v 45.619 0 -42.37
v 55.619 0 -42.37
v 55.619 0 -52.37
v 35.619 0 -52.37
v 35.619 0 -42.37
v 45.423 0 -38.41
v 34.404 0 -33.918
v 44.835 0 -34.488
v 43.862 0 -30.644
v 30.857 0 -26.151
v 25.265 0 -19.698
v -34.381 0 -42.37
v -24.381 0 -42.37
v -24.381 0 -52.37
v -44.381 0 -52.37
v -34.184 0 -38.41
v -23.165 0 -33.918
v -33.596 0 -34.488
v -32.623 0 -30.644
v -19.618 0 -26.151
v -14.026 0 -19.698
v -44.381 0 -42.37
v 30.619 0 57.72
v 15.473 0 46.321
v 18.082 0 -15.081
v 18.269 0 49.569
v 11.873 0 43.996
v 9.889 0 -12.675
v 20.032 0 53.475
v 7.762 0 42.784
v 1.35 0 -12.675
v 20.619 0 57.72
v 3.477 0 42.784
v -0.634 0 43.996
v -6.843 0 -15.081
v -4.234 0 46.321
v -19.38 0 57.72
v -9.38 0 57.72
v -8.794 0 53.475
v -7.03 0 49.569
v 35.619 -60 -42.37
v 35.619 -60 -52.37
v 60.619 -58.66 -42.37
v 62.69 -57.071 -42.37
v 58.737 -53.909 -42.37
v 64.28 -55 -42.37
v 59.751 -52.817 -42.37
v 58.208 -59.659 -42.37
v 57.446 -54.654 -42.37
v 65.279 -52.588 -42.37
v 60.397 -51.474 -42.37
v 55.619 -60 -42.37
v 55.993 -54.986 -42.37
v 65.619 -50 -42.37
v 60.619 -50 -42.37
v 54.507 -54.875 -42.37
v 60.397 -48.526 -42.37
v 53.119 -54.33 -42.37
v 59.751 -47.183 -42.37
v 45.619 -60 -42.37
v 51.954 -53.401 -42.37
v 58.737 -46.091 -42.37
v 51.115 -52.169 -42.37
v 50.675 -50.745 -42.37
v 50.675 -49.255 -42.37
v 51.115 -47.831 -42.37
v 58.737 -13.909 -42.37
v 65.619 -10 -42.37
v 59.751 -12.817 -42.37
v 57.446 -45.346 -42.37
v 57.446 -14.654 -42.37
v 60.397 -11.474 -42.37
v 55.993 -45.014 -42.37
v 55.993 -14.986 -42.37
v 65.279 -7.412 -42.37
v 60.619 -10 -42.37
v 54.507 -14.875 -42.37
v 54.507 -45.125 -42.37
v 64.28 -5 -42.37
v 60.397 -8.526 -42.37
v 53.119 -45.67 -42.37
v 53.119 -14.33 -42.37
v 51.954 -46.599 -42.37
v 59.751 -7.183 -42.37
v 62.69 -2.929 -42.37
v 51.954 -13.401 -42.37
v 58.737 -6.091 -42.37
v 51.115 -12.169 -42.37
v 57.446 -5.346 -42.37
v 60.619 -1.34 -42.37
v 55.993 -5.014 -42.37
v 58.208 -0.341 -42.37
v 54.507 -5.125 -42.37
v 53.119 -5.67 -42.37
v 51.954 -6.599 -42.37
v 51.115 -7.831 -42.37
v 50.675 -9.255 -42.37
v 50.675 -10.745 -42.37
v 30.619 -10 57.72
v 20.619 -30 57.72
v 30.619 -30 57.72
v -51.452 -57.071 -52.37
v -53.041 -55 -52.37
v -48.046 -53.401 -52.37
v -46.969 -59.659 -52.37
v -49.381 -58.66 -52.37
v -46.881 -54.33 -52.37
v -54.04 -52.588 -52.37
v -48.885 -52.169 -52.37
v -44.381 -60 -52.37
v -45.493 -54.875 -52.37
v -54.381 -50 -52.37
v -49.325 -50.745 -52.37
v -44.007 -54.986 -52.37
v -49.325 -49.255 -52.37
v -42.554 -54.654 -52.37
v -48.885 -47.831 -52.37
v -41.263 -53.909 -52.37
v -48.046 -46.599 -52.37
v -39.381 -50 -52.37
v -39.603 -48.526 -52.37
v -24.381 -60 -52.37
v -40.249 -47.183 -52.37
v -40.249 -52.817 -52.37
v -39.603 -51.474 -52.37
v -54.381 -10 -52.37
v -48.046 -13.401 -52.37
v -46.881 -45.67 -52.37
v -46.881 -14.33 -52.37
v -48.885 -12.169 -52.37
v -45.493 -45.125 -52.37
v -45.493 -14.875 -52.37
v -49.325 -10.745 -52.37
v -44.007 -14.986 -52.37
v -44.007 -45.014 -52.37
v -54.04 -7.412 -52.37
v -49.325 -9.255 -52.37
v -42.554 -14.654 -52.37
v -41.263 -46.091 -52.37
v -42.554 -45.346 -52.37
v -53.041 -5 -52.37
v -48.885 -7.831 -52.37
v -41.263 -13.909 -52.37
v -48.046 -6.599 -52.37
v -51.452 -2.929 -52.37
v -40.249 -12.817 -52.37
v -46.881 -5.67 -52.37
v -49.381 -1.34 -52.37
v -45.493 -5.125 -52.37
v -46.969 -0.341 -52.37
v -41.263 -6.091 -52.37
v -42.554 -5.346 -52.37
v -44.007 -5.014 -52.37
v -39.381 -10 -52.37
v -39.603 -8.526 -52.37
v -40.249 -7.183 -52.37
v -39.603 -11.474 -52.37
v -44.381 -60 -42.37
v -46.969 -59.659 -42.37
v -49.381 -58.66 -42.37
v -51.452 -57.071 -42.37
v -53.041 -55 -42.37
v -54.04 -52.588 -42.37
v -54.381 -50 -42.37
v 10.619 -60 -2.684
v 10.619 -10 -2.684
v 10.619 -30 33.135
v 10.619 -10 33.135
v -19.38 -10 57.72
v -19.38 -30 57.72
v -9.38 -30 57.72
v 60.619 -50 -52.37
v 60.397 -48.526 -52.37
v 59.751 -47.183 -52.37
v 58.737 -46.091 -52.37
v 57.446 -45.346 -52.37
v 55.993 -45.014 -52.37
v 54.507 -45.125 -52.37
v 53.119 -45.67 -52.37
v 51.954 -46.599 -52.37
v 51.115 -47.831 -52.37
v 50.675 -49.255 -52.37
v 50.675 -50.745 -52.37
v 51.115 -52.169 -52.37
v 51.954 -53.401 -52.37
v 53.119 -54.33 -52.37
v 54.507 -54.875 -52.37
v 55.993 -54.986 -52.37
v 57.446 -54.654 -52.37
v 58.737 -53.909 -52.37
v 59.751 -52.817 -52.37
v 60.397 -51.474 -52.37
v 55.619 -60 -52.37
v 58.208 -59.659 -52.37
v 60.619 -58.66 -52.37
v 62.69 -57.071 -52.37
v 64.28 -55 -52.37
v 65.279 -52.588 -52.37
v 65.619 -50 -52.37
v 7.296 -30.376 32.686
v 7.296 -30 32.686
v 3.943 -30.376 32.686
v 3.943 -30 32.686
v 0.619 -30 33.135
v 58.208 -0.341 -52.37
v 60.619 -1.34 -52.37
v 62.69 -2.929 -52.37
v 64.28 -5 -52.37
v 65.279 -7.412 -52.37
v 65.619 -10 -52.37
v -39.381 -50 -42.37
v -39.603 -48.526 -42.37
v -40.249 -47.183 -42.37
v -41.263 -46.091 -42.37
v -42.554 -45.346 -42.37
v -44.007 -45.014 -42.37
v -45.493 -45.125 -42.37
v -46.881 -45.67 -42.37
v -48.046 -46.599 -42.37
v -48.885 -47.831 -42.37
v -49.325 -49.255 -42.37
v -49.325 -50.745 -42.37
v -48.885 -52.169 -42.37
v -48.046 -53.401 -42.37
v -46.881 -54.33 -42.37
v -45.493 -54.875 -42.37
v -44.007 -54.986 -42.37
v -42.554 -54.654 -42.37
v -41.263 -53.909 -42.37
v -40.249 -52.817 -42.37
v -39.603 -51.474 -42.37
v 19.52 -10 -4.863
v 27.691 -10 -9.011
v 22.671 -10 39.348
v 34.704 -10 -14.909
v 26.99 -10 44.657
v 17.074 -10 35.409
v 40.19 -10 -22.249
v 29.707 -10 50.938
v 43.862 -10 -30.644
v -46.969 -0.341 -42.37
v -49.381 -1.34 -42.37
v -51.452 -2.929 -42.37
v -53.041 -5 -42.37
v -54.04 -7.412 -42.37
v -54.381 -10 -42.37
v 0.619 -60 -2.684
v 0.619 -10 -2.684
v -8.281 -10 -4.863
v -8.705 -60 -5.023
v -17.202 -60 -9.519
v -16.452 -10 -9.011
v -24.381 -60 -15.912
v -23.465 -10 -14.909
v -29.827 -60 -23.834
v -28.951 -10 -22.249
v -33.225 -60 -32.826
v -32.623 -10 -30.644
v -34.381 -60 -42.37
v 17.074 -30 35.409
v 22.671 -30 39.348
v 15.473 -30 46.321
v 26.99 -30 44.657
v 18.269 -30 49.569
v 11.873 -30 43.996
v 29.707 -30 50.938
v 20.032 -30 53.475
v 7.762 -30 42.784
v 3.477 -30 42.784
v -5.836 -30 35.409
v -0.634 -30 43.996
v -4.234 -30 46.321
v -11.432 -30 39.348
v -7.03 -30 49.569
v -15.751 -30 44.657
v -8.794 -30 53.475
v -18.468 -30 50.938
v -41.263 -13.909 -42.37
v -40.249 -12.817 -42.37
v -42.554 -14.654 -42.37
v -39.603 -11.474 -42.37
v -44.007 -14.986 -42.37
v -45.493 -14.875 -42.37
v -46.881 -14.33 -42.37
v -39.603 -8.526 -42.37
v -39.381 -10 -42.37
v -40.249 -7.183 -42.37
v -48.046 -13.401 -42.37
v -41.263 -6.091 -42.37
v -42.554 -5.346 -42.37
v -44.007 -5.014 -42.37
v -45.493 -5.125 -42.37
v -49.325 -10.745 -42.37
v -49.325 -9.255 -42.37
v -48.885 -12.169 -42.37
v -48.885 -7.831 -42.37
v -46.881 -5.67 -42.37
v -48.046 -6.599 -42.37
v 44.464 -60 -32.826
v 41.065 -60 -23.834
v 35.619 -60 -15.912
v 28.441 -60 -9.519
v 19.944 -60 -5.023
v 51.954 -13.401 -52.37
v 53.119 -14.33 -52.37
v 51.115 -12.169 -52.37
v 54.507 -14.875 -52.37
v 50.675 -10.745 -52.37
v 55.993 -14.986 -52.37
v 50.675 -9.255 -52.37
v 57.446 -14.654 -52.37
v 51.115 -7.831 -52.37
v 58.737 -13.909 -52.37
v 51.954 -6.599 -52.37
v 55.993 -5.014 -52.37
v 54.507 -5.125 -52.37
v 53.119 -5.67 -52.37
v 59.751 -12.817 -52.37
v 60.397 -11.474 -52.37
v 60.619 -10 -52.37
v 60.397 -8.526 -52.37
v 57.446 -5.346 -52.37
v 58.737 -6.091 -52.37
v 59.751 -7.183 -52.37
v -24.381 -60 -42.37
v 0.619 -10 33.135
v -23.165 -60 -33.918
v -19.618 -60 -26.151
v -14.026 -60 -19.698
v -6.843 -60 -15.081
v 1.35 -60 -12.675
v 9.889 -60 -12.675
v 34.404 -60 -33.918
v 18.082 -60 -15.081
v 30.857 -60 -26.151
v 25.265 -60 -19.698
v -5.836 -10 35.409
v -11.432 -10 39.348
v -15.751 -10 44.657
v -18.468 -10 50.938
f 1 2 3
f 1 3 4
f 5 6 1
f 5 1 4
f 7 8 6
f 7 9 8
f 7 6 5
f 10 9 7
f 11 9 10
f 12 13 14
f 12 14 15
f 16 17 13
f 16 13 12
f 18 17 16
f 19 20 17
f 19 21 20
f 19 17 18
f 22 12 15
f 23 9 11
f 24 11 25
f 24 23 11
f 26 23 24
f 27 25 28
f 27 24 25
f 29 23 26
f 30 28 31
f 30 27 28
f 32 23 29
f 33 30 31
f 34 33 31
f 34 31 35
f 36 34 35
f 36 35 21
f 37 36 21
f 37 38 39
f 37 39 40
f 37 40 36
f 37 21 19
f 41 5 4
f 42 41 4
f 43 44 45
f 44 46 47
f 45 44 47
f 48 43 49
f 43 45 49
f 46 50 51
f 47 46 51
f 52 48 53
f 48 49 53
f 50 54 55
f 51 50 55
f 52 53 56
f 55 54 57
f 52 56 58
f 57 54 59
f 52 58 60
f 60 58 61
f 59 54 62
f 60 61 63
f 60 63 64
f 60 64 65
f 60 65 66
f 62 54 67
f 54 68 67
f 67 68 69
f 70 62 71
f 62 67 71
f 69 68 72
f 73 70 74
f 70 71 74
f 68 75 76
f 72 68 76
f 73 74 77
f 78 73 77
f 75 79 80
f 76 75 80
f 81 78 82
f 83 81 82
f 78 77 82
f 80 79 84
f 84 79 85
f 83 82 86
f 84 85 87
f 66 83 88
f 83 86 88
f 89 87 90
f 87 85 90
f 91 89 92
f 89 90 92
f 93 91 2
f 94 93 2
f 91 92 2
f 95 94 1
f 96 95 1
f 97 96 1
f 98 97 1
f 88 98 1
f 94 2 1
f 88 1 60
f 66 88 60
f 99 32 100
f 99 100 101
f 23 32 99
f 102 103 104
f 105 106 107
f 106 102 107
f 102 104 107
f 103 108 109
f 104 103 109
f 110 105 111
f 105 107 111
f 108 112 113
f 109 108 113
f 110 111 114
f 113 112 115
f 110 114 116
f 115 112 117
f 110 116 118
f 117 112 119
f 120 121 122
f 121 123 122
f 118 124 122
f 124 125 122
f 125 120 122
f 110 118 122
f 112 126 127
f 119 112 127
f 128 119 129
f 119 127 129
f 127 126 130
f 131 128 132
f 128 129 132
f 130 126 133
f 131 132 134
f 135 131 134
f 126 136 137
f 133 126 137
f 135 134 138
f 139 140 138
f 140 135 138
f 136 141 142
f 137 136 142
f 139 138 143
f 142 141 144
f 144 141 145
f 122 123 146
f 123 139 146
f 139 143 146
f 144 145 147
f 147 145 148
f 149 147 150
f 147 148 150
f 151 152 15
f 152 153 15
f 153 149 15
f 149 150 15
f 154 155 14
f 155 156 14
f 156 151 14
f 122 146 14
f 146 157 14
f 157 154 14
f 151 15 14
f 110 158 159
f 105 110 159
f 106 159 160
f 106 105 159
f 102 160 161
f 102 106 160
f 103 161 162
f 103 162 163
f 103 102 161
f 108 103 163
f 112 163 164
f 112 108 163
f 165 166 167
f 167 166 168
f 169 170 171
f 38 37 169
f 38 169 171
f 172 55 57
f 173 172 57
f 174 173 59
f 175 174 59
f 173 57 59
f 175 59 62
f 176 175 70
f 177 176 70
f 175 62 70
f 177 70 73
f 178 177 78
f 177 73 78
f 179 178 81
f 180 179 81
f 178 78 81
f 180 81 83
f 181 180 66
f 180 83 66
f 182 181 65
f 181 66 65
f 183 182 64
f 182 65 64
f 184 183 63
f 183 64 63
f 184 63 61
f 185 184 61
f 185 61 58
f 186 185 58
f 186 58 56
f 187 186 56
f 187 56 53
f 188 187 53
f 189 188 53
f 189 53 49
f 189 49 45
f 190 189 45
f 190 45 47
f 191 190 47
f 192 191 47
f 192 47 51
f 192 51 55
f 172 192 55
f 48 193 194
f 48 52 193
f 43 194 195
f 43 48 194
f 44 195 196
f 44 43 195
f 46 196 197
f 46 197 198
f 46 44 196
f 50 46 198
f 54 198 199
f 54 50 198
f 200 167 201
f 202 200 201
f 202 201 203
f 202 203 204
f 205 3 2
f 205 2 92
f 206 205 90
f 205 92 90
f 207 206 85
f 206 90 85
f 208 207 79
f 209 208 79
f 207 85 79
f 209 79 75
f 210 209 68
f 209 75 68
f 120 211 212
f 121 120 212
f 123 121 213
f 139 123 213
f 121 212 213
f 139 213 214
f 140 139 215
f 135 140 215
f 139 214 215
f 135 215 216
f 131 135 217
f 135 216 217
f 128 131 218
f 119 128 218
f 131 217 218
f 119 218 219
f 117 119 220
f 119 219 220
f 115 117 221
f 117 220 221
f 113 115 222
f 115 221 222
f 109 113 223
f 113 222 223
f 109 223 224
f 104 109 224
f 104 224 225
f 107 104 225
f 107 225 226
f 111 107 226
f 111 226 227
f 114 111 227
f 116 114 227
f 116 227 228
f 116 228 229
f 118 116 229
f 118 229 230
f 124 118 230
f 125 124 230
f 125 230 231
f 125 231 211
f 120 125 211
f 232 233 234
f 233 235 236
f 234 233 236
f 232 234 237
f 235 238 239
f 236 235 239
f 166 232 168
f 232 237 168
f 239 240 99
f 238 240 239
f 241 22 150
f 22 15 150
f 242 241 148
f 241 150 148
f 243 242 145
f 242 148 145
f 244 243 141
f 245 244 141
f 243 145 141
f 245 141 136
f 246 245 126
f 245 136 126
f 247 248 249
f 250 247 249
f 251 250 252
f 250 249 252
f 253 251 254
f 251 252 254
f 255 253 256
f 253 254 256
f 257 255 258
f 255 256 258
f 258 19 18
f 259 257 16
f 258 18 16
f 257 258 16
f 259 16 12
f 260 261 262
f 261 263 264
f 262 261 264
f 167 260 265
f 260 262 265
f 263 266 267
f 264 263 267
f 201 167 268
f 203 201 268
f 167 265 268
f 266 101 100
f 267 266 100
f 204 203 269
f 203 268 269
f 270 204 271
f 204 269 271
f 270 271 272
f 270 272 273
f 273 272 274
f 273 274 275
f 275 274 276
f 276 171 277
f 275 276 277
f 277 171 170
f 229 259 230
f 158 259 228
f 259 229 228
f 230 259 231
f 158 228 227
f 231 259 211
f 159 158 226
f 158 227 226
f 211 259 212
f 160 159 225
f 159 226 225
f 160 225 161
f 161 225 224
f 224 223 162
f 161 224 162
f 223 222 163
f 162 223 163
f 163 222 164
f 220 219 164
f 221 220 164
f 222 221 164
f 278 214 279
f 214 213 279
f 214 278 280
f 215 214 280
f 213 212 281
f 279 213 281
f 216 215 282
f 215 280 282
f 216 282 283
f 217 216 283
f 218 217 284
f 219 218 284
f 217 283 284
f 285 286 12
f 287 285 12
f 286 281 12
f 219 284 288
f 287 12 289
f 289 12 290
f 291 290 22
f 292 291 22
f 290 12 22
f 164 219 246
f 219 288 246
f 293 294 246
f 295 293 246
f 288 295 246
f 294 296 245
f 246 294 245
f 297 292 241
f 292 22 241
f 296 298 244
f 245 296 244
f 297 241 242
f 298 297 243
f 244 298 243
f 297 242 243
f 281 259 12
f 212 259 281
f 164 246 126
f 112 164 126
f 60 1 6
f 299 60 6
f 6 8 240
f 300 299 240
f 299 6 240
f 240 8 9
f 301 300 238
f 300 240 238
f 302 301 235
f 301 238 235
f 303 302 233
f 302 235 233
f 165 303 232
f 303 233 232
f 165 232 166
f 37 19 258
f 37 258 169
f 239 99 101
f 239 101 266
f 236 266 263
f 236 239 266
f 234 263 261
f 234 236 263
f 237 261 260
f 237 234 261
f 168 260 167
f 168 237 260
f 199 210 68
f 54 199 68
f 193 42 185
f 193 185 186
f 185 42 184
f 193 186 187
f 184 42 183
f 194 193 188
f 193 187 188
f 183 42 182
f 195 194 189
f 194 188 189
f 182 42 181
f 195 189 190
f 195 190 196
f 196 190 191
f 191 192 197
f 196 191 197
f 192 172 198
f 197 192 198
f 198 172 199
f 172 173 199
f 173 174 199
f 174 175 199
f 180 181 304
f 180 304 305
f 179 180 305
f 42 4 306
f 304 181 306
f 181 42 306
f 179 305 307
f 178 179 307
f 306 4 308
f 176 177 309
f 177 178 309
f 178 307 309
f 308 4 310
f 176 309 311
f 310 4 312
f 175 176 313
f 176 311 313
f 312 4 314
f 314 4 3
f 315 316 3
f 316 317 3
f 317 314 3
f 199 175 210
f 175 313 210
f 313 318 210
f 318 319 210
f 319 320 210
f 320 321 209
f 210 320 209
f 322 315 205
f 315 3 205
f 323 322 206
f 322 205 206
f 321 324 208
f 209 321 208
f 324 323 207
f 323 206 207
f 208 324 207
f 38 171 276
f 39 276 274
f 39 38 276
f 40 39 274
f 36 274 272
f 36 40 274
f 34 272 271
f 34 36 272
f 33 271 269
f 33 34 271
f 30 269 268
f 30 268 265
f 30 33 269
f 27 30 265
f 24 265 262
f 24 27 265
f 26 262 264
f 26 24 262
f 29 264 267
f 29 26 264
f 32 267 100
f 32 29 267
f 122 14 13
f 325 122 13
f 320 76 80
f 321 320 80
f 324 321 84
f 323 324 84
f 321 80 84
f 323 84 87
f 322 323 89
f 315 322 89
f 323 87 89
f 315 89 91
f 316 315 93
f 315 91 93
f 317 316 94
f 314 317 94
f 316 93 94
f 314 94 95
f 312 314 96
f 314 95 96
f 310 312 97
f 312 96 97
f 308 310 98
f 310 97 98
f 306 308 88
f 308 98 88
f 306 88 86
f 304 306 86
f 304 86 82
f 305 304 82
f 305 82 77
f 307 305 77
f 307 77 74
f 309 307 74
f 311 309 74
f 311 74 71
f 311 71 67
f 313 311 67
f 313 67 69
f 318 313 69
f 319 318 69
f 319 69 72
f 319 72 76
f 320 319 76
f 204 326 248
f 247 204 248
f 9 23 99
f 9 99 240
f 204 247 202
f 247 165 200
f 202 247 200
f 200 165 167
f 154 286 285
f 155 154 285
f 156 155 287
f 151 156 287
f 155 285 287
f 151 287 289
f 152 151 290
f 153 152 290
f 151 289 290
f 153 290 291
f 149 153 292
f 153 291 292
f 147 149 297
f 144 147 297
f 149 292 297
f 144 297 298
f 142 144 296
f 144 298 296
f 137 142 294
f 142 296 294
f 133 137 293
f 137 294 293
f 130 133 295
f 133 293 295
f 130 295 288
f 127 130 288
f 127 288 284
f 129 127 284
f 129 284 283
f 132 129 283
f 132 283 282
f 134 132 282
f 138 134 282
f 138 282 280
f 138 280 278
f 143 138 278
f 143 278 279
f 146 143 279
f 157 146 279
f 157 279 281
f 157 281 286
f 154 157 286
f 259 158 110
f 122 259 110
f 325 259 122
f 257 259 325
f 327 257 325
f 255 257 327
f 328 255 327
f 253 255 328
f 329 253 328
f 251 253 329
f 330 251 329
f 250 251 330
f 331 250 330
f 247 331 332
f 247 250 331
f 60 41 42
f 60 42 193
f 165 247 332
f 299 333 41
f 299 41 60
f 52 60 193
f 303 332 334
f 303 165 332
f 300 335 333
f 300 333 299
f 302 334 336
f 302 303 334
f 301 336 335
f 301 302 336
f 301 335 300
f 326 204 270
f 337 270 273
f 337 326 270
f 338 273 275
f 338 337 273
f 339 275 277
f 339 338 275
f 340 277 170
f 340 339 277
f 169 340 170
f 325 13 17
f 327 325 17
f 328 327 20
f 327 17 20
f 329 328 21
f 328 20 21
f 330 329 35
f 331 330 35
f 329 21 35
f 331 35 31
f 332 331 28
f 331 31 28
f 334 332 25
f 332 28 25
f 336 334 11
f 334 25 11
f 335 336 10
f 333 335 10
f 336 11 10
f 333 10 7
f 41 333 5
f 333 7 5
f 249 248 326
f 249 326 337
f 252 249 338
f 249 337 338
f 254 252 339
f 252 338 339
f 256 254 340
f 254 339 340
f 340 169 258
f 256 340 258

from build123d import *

# Parameters (mm, degrees)
F1_DEPTH  = 60
F3_DEPTH  = 10
F4_DEPTH  = 30
F6_DEPTH  = 50
F8_DEPTH  = 25
F9_R      = 5
F10_DEPTH = 25
F11_R     = 10


with BuildPart() as f1:
    # F0 (on Front) → F1 (new body)
    with BuildSketch(Plane.XZ):
        with BuildLine():
            Line((-34.3805874884, -42.3699883783), (-54.3805874884, -42.3699883783))
            Line((-54.3805874884, -42.3699883783), (-54.3805874884, -52.3699883783))
            Line((-54.3805874884, -52.3699883783), (-24.3805874884, -52.3699883783))
            Line((-24.3805874884, -52.3699883783), (-24.3805874884, -42.3699883783))
            ThreePointArc((-24.3805874884, -42.3699883783), (5.6194125116, -12.3699883783), (35.6194125116, -42.3699883783))
            Line((35.6194125116, -42.3699883783), (35.6194125116, -52.3699883783))
            Line((35.6194125116, -52.3699883783), (65.6194125116, -52.3699883783))
            Line((65.6194125116, -52.3699883783), (65.6194125116, -42.3699883783))
            Line((65.6194125116, -42.3699883783), (45.6194125116, -42.3699883783))
            ThreePointArc((45.6194125116, -42.3699883783), (5.6194125116, -2.3699883783), (-34.3805874884, -42.3699883783))
        make_face()
    extrude(amount=F1_DEPTH)

    # F2 (on face) → F3 (join)
    with BuildSketch(Plane(origin=(0, 0, 0), x_dir=(-1, 0, 0), z_dir=(0, 1, 0))):
        with BuildLine():
            ThreePointArc((19.3804243856, 57.7203172984), (-5.6194125116, 32.6300116217), (-30.6192494088, 57.7203172984))
            Line((-30.6192494088, 57.7203172984), (-43.8620893558, -30.6440484251))
            ThreePointArc((-43.8620893558, -30.6440484251), (-5.6194125116, -2.3699883783), (32.6232643327, -30.6440484251))
            Line((32.6232643327, -30.6440484251), (19.3804243856, 57.7203172984))
        make_face()
    extrude(amount=-F3_DEPTH)

    # F2 (on face) → F4 (join)
    with BuildSketch(Plane(origin=(0, 0, 0), x_dir=(-1, 0, 0), z_dir=(0, 1, 0))):
        with BuildLine():
            ThreePointArc((9.3803156488, 57.7203172984), (-5.6194125116, 42.6300116217), (-20.6191406719, 57.7203172984))
            Line((-20.6191406719, 57.7203172984), (-30.6192494088, 57.7203172984))
            ThreePointArc((-30.6192494088, 57.7203172984), (-5.6194125116, 32.6300116217), (19.3804243856, 57.7203172984))
            Line((19.3804243856, 57.7203172984), (9.3803156488, 57.7203172984))
        make_face()
    extrude(amount=-F4_DEPTH)

    # F5 (on face) → F6 (join, through all)
    with BuildSketch(Plane.XZ.offset(10)):
        with BuildLine():
            ThreePointArc((10.6194125116, 33.1351141939), (5.6194125116, 32.6300116217), (0.6194125116, 33.1351141939))
            Line((0.6194125116, 33.1351141939), (0.6194125116, -2.6837187123))
            ThreePointArc((0.6194125116, -2.6837187123), (5.6194125116, -2.3699883783), (10.6194125116, -2.6837187123))
            Line((10.6194125116, -2.6837187123), (10.6194125116, 33.1351141939))
        make_face()
    extrude(amount=F6_DEPTH)

    # F7 (on face) → F8 (cut)
    with BuildSketch(Plane.YZ.offset(10.6194125116)):
        Polygon((-60, -2.6837187123), (-30, 33.1351141939), (-60, 33.1351141939), align=None)
    extrude(amount=-F8_DEPTH, mode=Mode.SUBTRACT)

    # F9 (on face) → F10 (cut)
    with BuildSketch(Plane.XY.offset(-42.3699883783)):
        with Locations((55.6194125116, -50)):
            Circle(F9_R)
        with Locations((55.6194125116, -10)):
            Circle(F9_R)
        with Locations((-44.3805874884, -50)):
            Circle(F9_R)
        with Locations((-44.3805874884, -10)):
            Circle(F9_R)
    extrude(amount=-F10_DEPTH, mode=Mode.SUBTRACT)

    # F11
    f11_edges = [f1.edges().sort_by_distance(p)[0] for p in [
        (65.619413, -60, -47.369988),
        (65.619413, 0, -47.369988),
        (-54.380587, -60, -47.369988),
        (-54.380587, 0, -47.369988),
    ]]
    fillet(f11_edges, radius=F11_R)


solid = f1.part
